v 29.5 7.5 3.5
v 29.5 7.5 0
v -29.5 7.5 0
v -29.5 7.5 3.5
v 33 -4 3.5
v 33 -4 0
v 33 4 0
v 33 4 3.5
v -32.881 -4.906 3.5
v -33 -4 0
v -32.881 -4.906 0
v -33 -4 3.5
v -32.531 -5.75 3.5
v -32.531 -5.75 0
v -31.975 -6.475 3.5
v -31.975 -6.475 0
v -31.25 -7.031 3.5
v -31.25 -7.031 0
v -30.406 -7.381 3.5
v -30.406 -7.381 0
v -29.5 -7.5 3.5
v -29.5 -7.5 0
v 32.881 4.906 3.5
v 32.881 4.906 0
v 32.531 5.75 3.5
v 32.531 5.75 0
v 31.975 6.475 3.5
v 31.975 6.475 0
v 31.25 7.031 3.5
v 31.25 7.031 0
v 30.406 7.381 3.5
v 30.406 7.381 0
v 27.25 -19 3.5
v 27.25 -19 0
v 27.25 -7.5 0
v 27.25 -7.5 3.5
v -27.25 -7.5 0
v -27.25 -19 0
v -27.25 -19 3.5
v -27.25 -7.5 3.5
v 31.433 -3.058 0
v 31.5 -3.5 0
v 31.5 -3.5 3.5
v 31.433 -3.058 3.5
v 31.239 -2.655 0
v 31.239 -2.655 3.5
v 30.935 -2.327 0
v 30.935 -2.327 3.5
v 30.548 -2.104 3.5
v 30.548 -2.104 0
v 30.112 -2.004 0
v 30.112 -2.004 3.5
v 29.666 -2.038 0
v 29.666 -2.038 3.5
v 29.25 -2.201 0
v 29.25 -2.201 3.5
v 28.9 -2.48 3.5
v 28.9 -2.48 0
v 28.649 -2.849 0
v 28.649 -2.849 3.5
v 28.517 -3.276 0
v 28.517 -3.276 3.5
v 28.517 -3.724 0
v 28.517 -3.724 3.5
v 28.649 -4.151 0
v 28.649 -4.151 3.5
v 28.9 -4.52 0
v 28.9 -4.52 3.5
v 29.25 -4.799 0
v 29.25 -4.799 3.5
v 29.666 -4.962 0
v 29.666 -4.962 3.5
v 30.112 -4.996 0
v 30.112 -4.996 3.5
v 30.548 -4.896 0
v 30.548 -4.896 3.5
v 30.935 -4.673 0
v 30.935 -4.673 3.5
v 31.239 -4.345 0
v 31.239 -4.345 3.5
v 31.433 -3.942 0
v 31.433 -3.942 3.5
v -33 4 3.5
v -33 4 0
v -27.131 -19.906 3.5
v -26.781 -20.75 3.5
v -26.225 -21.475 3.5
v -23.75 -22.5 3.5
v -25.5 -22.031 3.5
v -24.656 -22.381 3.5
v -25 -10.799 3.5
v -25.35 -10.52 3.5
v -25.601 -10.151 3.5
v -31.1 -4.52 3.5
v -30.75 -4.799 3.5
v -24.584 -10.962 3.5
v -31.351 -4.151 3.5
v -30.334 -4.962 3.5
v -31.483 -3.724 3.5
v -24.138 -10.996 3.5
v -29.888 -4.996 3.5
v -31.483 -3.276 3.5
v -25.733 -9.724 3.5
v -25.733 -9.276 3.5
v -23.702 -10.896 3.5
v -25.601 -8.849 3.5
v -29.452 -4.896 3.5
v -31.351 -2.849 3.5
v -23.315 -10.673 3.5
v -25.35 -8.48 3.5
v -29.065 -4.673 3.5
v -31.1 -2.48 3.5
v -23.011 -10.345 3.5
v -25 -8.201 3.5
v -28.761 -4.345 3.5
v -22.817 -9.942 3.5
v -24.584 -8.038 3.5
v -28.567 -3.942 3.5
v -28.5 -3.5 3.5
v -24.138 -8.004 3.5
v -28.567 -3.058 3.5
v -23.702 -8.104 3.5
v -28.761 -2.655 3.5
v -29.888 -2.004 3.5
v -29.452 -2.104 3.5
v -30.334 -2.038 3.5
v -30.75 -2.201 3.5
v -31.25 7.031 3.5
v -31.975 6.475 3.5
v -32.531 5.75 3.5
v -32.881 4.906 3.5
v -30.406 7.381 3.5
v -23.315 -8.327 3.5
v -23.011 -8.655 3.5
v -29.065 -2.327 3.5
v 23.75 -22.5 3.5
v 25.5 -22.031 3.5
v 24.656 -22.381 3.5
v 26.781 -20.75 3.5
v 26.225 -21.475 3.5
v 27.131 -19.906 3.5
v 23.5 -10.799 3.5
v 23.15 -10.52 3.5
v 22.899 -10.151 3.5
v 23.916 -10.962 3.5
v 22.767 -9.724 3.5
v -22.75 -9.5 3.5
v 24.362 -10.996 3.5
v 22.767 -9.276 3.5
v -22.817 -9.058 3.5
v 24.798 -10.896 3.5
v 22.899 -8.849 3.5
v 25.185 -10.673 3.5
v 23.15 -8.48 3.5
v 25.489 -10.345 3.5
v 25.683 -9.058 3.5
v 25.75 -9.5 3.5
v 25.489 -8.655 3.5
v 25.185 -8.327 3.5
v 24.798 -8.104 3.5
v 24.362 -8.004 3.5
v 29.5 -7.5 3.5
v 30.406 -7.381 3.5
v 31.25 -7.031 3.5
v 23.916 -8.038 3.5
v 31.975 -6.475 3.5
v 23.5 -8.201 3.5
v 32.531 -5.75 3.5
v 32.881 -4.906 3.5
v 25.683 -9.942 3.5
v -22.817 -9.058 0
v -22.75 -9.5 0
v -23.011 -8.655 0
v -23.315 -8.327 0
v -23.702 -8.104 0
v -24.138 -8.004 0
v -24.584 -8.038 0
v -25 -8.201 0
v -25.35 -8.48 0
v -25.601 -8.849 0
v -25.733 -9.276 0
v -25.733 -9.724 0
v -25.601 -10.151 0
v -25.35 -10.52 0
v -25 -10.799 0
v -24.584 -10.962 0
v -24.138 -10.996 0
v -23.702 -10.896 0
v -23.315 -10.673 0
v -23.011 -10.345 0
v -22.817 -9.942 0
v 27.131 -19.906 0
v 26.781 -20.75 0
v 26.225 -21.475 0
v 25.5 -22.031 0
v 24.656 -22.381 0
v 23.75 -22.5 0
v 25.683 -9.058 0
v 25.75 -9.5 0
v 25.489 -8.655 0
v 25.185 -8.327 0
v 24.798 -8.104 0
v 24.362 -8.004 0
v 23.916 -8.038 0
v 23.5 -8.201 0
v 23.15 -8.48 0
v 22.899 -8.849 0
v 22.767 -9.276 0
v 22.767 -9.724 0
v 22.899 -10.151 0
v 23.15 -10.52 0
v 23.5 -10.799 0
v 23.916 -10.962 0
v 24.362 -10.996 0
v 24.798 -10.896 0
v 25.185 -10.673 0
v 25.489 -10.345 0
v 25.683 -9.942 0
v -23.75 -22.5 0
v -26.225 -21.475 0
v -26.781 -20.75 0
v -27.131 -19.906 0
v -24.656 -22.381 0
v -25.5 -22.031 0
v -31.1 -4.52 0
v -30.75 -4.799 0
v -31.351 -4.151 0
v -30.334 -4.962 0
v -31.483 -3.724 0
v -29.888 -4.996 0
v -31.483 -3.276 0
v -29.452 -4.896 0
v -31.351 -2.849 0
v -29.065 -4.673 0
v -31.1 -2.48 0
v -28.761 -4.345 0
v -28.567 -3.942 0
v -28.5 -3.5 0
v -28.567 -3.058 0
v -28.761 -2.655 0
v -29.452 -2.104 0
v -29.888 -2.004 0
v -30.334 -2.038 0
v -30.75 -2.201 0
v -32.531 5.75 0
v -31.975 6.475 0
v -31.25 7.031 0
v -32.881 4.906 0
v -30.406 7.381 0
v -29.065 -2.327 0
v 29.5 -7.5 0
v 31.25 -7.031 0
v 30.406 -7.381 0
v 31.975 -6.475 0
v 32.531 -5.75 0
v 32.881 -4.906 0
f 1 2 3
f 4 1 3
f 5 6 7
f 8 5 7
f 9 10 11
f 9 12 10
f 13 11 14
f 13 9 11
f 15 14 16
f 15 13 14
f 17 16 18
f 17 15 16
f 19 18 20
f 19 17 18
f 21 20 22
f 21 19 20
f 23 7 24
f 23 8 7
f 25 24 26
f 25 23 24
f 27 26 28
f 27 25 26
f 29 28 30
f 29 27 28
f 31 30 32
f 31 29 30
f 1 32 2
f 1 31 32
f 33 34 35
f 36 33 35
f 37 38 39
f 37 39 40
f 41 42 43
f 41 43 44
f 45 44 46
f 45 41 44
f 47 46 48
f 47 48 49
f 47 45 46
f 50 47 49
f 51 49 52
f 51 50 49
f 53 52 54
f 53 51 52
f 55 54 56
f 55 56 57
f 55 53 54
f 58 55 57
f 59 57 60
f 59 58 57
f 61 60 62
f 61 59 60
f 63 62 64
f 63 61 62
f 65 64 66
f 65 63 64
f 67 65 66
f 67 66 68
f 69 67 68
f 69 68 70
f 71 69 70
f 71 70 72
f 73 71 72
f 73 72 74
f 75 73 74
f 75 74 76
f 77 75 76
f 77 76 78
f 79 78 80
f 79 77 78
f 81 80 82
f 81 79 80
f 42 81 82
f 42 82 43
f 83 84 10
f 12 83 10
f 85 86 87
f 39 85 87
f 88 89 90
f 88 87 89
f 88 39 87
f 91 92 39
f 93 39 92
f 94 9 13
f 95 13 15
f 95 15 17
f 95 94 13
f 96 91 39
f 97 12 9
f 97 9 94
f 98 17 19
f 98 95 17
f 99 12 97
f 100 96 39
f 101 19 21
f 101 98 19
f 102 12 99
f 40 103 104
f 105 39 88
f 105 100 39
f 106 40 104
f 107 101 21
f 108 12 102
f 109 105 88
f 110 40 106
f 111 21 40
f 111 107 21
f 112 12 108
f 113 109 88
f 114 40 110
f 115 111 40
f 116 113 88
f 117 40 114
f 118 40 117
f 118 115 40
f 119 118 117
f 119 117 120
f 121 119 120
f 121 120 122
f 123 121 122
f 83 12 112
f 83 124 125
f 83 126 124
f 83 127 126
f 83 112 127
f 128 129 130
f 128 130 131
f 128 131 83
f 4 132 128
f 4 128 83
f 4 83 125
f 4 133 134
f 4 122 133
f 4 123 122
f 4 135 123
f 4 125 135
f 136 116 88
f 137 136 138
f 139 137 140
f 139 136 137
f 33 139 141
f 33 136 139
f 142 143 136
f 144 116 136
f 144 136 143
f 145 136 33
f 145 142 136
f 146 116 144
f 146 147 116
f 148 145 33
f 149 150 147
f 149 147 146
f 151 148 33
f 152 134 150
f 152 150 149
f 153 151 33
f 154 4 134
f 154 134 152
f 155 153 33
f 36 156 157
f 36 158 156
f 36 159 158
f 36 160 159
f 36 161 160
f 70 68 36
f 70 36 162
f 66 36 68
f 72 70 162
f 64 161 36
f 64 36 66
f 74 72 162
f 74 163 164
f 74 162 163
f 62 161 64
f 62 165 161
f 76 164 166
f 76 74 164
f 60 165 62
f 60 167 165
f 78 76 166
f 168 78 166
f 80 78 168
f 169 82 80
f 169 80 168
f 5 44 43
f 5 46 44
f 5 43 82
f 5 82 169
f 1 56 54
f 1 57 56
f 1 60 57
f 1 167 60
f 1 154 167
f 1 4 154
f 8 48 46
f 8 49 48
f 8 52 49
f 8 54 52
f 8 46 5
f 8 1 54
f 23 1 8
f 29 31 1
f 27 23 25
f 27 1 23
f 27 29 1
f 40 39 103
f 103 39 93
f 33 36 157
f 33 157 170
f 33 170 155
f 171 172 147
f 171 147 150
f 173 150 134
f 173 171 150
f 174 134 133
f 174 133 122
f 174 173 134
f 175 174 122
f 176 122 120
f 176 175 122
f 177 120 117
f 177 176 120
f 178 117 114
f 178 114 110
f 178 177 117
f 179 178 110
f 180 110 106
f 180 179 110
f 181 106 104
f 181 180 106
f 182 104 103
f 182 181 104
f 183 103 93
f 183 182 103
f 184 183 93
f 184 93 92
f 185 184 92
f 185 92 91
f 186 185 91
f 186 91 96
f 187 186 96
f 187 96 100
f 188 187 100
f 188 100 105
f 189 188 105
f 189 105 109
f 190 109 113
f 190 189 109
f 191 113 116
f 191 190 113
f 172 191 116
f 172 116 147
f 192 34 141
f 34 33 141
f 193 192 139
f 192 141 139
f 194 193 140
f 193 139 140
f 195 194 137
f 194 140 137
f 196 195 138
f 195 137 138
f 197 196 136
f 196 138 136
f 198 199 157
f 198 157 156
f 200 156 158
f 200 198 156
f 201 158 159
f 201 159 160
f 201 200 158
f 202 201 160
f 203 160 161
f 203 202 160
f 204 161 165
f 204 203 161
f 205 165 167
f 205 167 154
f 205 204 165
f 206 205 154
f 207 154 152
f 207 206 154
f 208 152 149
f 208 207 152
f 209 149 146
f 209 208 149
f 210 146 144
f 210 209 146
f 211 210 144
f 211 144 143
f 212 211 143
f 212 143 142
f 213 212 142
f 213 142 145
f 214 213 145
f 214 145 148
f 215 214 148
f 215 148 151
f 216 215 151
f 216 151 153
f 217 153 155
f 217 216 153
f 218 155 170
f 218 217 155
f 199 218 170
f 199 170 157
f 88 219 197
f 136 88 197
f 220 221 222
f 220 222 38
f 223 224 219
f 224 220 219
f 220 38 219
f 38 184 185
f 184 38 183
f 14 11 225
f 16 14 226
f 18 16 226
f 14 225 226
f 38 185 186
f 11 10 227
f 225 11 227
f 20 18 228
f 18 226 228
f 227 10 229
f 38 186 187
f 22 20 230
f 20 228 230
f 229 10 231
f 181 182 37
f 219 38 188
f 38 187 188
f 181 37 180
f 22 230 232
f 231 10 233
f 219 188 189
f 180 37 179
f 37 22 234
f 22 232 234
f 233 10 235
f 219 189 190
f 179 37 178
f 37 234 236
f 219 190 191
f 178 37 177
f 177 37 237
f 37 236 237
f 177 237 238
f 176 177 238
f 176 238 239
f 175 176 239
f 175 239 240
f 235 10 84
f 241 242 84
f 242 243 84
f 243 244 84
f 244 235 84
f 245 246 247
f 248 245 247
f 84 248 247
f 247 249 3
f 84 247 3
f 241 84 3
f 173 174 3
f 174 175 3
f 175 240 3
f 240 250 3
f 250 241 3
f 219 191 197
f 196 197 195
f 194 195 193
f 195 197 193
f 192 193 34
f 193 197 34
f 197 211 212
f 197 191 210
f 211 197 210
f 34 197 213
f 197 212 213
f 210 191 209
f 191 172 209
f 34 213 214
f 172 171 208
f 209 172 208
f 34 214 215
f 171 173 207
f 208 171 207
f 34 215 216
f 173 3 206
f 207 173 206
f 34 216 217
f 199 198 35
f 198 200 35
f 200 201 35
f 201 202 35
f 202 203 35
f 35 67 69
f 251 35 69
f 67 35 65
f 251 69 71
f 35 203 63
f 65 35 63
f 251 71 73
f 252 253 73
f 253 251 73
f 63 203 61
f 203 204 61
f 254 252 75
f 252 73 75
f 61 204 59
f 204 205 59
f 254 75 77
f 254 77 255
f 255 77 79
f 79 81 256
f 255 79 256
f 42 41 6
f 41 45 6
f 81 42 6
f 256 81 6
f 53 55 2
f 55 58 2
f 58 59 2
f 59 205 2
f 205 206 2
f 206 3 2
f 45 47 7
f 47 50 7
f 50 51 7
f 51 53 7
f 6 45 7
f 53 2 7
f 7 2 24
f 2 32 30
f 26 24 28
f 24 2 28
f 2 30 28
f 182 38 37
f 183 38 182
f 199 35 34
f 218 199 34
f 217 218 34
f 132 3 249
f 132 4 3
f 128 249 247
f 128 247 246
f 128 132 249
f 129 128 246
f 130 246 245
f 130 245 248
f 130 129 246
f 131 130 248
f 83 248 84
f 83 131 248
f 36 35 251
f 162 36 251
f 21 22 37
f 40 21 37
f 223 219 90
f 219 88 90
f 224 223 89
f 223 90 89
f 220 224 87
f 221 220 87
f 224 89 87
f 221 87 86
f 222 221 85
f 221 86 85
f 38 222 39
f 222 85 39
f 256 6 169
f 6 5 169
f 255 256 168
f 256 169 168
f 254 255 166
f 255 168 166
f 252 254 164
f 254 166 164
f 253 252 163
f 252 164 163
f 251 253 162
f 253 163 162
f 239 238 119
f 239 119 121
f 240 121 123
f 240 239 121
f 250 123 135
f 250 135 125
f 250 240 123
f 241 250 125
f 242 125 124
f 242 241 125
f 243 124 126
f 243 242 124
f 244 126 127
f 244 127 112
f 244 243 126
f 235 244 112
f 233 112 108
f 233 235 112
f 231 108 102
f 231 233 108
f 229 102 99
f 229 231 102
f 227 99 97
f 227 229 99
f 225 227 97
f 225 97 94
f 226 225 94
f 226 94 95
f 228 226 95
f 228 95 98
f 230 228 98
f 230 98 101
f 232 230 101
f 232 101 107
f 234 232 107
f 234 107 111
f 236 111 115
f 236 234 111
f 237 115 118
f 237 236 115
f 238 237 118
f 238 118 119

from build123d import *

# Parameters (mm, degrees)
F0_R     = 1.5
F0_W     = 54.5
F0_H     = 15
F1_DEPTH = 3.5
F2_R     = 3.5


with BuildPart() as f1:
    # F0 (on Top) → F1 (new body)
    with BuildSketch(Plane.XY):
        Polygon((27.25, -7.5), (33, -7.5), (33, 7.5), (-33, 7.5), (-33, -7.5), (-27.25, -7.5), align=None)
        with Locations((-30, -3.5)):
            Circle(F0_R, mode=Mode.SUBTRACT)
        with Locations((30, -3.5)):
            Circle(F0_R, mode=Mode.SUBTRACT)
        with Locations((0, -15)):
            Rectangle(F0_W, F0_H)
        with Locations((-24.25, -9.5)):
            Circle(F0_R, mode=Mode.SUBTRACT)
        with Locations((24.25, -9.5)):
            Circle(F0_R, mode=Mode.SUBTRACT)
    extrude(amount=F1_DEPTH)

    # F2
    f2_edges = [f1.edges().sort_by_distance(p)[0] for p in [
        (-33, 7.5, 1.75),
        (33, 7.5, 1.75),
        (27.25, -22.5, 1.75),
        (-27.25, -22.5, 1.75),
        (33, -7.5, 1.75),
        (-33, -7.5, 1.75),
    ]]
    fillet(f2_edges, radius=F2_R)


solid = f1.part
